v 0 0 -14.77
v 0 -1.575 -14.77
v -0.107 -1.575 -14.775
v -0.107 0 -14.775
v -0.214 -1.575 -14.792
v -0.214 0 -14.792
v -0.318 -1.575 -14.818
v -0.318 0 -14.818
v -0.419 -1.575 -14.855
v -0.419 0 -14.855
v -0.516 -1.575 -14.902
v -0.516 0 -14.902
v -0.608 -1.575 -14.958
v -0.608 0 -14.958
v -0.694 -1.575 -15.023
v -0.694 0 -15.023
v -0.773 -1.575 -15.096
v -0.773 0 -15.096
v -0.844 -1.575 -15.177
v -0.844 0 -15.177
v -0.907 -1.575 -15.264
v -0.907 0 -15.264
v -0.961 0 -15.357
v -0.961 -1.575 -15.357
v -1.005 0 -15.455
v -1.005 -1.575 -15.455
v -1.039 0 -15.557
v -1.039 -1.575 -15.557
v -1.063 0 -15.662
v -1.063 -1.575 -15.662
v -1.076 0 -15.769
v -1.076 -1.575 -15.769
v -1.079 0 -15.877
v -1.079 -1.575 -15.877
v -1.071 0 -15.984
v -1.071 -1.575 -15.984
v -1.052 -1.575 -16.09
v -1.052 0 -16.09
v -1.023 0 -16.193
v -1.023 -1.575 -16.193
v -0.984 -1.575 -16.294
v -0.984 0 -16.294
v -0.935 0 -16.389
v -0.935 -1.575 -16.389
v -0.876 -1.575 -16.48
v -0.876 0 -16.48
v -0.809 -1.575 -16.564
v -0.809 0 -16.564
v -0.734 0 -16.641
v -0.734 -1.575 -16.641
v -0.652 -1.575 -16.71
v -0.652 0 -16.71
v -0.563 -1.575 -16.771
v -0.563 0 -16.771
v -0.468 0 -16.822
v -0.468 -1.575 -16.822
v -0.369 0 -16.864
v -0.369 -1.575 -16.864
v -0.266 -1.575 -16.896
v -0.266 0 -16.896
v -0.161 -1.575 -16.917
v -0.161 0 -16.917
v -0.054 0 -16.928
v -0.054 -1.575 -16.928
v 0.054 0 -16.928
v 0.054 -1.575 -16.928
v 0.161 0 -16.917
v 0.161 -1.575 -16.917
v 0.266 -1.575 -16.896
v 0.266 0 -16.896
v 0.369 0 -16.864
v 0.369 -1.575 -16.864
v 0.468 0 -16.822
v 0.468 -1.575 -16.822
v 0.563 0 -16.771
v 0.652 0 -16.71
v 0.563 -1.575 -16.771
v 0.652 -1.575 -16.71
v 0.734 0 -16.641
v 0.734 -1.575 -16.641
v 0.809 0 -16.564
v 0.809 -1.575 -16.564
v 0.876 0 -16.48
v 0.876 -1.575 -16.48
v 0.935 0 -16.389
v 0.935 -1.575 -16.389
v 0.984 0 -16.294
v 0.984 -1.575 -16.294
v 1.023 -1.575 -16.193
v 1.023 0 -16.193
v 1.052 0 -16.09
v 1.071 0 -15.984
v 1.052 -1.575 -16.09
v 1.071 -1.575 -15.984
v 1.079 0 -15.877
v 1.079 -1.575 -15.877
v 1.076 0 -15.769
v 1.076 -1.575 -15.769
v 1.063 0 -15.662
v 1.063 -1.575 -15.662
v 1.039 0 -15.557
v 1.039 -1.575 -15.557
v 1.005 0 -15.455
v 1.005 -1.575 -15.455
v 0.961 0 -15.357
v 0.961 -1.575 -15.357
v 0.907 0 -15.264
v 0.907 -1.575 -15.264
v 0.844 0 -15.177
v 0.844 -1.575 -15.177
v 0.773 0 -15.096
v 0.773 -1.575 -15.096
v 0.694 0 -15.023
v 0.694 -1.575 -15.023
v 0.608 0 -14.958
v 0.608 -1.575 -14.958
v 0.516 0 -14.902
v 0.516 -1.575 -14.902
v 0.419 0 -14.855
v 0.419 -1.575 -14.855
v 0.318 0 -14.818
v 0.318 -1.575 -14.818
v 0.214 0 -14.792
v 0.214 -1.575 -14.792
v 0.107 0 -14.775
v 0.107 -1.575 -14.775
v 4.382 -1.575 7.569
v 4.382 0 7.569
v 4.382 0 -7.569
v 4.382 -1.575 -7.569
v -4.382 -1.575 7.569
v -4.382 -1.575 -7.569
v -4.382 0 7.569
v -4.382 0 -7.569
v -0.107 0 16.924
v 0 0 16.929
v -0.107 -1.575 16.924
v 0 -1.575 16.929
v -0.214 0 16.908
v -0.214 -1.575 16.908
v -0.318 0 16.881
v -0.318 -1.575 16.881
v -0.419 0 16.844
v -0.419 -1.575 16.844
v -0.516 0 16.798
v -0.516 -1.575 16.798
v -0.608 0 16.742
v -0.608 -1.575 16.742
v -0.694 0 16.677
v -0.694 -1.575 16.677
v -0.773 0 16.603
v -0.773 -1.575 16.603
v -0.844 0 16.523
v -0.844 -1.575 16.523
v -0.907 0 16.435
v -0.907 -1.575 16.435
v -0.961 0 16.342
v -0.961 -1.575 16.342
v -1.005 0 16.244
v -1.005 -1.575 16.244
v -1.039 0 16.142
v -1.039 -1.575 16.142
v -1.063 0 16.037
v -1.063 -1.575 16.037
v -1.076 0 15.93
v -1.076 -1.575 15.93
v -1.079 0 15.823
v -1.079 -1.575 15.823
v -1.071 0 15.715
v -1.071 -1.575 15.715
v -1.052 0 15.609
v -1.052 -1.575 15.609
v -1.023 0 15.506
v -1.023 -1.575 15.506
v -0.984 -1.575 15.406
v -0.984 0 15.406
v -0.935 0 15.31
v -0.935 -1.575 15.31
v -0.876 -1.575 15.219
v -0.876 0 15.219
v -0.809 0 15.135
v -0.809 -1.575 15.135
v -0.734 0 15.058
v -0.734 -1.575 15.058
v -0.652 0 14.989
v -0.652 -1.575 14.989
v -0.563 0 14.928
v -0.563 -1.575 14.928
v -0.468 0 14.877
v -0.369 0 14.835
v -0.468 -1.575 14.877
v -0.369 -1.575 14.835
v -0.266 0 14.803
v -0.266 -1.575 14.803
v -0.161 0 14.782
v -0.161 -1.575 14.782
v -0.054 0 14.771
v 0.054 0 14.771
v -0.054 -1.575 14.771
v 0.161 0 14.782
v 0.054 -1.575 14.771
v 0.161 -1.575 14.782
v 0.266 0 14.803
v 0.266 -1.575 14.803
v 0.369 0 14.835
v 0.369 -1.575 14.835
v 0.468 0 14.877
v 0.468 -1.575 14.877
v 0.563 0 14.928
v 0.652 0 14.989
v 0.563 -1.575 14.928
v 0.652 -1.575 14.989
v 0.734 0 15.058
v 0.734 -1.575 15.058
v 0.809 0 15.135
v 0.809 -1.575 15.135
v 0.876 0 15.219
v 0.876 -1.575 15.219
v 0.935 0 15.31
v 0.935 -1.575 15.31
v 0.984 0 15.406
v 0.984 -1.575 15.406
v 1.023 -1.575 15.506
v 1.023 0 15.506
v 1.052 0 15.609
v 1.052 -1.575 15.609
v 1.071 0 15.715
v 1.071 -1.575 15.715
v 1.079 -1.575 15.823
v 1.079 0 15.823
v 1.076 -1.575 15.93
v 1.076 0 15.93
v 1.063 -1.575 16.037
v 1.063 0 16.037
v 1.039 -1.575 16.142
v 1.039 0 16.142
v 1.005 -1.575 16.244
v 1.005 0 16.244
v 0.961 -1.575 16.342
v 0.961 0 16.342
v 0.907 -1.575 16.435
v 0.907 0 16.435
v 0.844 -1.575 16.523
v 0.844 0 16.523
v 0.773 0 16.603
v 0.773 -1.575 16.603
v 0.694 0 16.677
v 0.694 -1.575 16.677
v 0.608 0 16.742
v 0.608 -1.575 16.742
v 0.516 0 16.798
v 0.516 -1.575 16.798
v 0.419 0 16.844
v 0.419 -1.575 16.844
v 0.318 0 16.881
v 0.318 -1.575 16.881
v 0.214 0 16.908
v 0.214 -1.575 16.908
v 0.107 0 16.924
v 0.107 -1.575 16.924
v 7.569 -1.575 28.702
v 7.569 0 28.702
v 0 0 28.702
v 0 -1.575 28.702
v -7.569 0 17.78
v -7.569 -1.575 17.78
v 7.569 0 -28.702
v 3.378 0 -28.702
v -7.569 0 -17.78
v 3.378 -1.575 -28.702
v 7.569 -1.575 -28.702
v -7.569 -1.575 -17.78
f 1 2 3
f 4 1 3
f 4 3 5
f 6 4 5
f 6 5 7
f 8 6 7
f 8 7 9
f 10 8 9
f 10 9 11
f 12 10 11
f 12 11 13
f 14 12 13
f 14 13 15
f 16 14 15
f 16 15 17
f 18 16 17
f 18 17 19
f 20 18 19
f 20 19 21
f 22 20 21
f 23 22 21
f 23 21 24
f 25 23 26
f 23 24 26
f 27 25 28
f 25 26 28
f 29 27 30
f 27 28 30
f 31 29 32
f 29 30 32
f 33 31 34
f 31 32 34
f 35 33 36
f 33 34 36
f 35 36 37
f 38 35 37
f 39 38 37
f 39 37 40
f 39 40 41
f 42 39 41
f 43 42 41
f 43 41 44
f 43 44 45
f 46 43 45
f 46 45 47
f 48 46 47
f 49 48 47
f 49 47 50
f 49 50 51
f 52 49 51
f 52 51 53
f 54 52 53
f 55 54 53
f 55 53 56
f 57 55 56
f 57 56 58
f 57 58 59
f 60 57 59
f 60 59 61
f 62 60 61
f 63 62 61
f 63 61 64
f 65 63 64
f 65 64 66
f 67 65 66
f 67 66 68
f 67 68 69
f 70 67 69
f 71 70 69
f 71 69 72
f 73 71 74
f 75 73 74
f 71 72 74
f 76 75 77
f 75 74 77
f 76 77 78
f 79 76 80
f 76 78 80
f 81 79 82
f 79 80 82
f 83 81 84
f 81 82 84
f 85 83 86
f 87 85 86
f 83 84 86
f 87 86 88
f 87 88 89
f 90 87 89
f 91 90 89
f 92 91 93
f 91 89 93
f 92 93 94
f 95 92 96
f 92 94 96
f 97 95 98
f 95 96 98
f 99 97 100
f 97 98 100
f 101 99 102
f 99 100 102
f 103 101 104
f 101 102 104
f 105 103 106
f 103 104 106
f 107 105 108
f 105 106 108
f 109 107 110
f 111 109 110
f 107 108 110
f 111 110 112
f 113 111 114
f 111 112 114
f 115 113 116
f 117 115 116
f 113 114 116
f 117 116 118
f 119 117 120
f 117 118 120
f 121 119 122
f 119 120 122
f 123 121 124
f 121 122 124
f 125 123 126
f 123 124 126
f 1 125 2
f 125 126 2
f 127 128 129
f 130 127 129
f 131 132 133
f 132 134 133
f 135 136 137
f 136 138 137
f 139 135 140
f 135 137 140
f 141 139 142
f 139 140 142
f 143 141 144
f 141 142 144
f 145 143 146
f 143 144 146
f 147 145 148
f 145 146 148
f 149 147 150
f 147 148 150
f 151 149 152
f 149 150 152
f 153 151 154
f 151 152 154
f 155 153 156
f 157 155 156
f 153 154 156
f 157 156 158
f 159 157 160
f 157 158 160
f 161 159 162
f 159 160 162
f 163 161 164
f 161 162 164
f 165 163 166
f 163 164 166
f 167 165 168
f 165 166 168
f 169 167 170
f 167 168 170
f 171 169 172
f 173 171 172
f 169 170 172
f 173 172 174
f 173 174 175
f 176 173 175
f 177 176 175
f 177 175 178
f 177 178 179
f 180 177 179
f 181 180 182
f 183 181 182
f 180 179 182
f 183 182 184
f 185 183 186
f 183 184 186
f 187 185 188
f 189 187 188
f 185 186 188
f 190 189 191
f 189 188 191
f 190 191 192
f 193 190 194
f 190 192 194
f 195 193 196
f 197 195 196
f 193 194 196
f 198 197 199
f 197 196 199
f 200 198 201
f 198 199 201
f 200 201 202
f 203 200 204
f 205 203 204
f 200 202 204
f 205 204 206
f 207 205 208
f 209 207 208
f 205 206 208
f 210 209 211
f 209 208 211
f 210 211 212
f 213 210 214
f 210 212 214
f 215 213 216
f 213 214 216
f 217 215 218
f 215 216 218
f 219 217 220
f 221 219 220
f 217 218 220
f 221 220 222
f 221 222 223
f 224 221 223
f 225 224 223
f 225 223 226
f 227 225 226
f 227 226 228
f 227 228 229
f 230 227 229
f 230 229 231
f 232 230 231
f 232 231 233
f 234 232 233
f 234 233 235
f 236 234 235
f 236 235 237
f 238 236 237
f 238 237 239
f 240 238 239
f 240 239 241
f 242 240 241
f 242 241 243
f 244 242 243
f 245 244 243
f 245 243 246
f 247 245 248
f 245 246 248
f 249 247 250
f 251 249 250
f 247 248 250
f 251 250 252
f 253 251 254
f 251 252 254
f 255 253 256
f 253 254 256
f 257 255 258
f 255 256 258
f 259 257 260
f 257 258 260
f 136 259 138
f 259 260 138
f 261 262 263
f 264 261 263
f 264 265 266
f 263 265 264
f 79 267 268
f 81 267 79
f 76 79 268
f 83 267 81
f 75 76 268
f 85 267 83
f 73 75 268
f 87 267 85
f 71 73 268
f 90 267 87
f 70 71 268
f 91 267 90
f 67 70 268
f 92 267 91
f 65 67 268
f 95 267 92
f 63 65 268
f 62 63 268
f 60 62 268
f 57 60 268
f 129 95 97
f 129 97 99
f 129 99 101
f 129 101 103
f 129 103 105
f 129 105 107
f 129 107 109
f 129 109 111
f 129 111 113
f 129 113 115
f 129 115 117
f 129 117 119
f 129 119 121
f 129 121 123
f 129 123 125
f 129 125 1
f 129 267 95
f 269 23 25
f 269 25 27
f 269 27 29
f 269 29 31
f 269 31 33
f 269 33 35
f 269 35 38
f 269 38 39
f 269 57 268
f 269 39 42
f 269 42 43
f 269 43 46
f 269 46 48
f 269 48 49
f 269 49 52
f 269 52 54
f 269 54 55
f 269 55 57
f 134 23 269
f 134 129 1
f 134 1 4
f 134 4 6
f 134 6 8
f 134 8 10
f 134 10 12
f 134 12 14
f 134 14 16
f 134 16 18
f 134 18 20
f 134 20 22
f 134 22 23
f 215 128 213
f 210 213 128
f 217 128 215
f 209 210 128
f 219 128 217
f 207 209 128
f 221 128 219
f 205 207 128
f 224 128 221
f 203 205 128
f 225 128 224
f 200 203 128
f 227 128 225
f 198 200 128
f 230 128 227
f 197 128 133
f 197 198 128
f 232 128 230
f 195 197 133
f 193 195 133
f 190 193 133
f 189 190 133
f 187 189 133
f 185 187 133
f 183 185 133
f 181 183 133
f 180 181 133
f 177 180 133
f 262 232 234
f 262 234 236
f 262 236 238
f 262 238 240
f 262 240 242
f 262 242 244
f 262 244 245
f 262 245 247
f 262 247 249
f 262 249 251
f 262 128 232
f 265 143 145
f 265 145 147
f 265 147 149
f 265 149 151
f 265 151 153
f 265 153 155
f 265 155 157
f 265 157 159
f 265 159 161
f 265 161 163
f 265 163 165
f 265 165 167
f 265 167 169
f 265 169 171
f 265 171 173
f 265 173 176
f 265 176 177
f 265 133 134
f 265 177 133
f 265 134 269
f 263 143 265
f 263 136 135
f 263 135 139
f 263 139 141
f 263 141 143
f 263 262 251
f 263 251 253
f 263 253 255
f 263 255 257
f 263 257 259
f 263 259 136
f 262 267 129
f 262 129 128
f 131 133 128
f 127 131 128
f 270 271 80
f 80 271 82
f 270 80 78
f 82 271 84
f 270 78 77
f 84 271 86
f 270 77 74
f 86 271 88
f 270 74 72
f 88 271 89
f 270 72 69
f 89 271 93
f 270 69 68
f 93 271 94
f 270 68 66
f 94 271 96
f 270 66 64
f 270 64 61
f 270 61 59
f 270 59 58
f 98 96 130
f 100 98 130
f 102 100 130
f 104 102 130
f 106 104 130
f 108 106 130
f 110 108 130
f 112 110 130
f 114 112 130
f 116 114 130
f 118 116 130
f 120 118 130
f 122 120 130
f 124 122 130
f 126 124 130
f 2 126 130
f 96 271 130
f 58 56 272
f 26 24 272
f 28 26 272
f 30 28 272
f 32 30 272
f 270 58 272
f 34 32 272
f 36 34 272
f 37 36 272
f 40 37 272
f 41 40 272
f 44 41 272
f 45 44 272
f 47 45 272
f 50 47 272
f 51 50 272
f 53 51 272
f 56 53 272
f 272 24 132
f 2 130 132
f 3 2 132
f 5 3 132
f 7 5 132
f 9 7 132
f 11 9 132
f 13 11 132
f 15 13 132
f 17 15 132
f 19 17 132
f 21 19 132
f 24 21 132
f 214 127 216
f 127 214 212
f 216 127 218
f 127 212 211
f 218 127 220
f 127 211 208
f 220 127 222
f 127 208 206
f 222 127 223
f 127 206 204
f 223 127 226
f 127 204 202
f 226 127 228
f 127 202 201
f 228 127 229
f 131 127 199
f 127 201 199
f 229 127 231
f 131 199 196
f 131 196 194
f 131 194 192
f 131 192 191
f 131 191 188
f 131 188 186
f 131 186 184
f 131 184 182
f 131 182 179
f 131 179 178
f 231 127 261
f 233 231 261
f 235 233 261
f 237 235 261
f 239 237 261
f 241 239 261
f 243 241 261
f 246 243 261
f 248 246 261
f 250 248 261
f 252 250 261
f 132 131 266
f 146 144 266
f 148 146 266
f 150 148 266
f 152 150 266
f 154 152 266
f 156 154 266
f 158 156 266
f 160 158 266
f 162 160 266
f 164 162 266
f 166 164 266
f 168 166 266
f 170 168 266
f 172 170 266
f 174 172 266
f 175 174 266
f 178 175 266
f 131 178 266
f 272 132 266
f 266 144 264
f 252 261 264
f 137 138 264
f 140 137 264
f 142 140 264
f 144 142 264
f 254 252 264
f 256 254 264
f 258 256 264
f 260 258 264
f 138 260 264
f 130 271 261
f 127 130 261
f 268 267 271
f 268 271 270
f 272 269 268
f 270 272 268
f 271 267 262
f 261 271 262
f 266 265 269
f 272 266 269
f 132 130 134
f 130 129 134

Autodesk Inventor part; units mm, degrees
ref_plane "YZ Plane" through (0, 0, 0) normal (1, 0, 0) x (0, 1, 0)
ref_plane "XZ Plane" through (0, 0, 0) normal (0, 1, 0) x (-1, 0, 0)
ref_plane "XY Plane" through (0, 0, 0) normal (0, 0, 1) x (1, 0, 0)
sketch "Sketch1" plane through (0, 0, 0) normal (0, 1, 0) x (-1, 0, 0)
  line L0 (-7.5692, 28.702) -> (7.5692, 28.702) construction
  line L1 (7.5692, 28.702) -> (7.5692, -28.702) construction
  line L2 (7.5692, -28.702) -> (-7.5692, -28.702) construction
  line L3 (-7.5692, -28.702) -> (-7.5692, 28.702) construction
  line L4 (-7.5692, 28.702) -> (7.5692, -28.702) construction
  line L5 (7.5692, 28.702) -> (-7.5692, -28.702) construction
  line L6 (-4.3815, -7.5692) -> (4.3815, -7.5692)
  line L7 (4.3815, -7.5692) -> (4.3815, 7.5692)
  line L8 (4.3815, 7.5692) -> (-4.3815, 7.5692)
  line L9 (-4.3815, 7.5692) -> (-4.3815, -7.5692)
  line L10 (-4.3815, -7.5692) -> (4.3815, 7.5692) construction
  line L11 (4.3815, -7.5692) -> (-4.3815, 7.5692) construction
  line L12 (-7.5692, -28.702) -> (-3.3782, -28.702)
  line L13 (7.5692, -17.78) -> (-3.3782, -28.702)
  line L14 (-7.5692, -28.702) -> (-7.5692, 0)
  line L15 (21.6792, 0) -> (-18.0822, 0) construction
  line L16 (-7.5692, 28.702) -> (-7.5692, 0)
  line L17 (7.5692, 0) -> (7.5692, -17.78)
  line L18 (7.5692, 0) -> (7.5692, 17.78)
  line L19 (-7.5692, 28.702) -> (0, 28.702)
  line L20 (7.5692, 17.78) -> (0, 28.702)
  point P0 (0, 0)
  point P1 (0, -15.8496)
  point P2 (0, 15.8496)
  point P3 (0, 0)
  dimension "d0" = 57.404
  dimension "d1" = 15.1384
  dimension "d2" = 8.763
  dimension "d3" = 15.1384
  dimension "d4" = 10.9474
  dimension "d5" = 10.922
  dimension "d7" = 7.5692
  dimension "d20" = 10.922
  dimension "d21" = 7.5692
  dimension "mounting_hole_distance" = 31.6992
extrude "Extrusion2" add sketch "Sketch1" against normal blind 1.5748
hole "Hole1" at (0, 0, -15.8496) at (0, 0, 15.8496) direction (0, -1, 0) diameter 2.159 depth 8.8646 tip angle 118
equation "\"d20\" = d5"
equation "\"d21\" = d7"
properties part number "orginal_headplate_ben"
